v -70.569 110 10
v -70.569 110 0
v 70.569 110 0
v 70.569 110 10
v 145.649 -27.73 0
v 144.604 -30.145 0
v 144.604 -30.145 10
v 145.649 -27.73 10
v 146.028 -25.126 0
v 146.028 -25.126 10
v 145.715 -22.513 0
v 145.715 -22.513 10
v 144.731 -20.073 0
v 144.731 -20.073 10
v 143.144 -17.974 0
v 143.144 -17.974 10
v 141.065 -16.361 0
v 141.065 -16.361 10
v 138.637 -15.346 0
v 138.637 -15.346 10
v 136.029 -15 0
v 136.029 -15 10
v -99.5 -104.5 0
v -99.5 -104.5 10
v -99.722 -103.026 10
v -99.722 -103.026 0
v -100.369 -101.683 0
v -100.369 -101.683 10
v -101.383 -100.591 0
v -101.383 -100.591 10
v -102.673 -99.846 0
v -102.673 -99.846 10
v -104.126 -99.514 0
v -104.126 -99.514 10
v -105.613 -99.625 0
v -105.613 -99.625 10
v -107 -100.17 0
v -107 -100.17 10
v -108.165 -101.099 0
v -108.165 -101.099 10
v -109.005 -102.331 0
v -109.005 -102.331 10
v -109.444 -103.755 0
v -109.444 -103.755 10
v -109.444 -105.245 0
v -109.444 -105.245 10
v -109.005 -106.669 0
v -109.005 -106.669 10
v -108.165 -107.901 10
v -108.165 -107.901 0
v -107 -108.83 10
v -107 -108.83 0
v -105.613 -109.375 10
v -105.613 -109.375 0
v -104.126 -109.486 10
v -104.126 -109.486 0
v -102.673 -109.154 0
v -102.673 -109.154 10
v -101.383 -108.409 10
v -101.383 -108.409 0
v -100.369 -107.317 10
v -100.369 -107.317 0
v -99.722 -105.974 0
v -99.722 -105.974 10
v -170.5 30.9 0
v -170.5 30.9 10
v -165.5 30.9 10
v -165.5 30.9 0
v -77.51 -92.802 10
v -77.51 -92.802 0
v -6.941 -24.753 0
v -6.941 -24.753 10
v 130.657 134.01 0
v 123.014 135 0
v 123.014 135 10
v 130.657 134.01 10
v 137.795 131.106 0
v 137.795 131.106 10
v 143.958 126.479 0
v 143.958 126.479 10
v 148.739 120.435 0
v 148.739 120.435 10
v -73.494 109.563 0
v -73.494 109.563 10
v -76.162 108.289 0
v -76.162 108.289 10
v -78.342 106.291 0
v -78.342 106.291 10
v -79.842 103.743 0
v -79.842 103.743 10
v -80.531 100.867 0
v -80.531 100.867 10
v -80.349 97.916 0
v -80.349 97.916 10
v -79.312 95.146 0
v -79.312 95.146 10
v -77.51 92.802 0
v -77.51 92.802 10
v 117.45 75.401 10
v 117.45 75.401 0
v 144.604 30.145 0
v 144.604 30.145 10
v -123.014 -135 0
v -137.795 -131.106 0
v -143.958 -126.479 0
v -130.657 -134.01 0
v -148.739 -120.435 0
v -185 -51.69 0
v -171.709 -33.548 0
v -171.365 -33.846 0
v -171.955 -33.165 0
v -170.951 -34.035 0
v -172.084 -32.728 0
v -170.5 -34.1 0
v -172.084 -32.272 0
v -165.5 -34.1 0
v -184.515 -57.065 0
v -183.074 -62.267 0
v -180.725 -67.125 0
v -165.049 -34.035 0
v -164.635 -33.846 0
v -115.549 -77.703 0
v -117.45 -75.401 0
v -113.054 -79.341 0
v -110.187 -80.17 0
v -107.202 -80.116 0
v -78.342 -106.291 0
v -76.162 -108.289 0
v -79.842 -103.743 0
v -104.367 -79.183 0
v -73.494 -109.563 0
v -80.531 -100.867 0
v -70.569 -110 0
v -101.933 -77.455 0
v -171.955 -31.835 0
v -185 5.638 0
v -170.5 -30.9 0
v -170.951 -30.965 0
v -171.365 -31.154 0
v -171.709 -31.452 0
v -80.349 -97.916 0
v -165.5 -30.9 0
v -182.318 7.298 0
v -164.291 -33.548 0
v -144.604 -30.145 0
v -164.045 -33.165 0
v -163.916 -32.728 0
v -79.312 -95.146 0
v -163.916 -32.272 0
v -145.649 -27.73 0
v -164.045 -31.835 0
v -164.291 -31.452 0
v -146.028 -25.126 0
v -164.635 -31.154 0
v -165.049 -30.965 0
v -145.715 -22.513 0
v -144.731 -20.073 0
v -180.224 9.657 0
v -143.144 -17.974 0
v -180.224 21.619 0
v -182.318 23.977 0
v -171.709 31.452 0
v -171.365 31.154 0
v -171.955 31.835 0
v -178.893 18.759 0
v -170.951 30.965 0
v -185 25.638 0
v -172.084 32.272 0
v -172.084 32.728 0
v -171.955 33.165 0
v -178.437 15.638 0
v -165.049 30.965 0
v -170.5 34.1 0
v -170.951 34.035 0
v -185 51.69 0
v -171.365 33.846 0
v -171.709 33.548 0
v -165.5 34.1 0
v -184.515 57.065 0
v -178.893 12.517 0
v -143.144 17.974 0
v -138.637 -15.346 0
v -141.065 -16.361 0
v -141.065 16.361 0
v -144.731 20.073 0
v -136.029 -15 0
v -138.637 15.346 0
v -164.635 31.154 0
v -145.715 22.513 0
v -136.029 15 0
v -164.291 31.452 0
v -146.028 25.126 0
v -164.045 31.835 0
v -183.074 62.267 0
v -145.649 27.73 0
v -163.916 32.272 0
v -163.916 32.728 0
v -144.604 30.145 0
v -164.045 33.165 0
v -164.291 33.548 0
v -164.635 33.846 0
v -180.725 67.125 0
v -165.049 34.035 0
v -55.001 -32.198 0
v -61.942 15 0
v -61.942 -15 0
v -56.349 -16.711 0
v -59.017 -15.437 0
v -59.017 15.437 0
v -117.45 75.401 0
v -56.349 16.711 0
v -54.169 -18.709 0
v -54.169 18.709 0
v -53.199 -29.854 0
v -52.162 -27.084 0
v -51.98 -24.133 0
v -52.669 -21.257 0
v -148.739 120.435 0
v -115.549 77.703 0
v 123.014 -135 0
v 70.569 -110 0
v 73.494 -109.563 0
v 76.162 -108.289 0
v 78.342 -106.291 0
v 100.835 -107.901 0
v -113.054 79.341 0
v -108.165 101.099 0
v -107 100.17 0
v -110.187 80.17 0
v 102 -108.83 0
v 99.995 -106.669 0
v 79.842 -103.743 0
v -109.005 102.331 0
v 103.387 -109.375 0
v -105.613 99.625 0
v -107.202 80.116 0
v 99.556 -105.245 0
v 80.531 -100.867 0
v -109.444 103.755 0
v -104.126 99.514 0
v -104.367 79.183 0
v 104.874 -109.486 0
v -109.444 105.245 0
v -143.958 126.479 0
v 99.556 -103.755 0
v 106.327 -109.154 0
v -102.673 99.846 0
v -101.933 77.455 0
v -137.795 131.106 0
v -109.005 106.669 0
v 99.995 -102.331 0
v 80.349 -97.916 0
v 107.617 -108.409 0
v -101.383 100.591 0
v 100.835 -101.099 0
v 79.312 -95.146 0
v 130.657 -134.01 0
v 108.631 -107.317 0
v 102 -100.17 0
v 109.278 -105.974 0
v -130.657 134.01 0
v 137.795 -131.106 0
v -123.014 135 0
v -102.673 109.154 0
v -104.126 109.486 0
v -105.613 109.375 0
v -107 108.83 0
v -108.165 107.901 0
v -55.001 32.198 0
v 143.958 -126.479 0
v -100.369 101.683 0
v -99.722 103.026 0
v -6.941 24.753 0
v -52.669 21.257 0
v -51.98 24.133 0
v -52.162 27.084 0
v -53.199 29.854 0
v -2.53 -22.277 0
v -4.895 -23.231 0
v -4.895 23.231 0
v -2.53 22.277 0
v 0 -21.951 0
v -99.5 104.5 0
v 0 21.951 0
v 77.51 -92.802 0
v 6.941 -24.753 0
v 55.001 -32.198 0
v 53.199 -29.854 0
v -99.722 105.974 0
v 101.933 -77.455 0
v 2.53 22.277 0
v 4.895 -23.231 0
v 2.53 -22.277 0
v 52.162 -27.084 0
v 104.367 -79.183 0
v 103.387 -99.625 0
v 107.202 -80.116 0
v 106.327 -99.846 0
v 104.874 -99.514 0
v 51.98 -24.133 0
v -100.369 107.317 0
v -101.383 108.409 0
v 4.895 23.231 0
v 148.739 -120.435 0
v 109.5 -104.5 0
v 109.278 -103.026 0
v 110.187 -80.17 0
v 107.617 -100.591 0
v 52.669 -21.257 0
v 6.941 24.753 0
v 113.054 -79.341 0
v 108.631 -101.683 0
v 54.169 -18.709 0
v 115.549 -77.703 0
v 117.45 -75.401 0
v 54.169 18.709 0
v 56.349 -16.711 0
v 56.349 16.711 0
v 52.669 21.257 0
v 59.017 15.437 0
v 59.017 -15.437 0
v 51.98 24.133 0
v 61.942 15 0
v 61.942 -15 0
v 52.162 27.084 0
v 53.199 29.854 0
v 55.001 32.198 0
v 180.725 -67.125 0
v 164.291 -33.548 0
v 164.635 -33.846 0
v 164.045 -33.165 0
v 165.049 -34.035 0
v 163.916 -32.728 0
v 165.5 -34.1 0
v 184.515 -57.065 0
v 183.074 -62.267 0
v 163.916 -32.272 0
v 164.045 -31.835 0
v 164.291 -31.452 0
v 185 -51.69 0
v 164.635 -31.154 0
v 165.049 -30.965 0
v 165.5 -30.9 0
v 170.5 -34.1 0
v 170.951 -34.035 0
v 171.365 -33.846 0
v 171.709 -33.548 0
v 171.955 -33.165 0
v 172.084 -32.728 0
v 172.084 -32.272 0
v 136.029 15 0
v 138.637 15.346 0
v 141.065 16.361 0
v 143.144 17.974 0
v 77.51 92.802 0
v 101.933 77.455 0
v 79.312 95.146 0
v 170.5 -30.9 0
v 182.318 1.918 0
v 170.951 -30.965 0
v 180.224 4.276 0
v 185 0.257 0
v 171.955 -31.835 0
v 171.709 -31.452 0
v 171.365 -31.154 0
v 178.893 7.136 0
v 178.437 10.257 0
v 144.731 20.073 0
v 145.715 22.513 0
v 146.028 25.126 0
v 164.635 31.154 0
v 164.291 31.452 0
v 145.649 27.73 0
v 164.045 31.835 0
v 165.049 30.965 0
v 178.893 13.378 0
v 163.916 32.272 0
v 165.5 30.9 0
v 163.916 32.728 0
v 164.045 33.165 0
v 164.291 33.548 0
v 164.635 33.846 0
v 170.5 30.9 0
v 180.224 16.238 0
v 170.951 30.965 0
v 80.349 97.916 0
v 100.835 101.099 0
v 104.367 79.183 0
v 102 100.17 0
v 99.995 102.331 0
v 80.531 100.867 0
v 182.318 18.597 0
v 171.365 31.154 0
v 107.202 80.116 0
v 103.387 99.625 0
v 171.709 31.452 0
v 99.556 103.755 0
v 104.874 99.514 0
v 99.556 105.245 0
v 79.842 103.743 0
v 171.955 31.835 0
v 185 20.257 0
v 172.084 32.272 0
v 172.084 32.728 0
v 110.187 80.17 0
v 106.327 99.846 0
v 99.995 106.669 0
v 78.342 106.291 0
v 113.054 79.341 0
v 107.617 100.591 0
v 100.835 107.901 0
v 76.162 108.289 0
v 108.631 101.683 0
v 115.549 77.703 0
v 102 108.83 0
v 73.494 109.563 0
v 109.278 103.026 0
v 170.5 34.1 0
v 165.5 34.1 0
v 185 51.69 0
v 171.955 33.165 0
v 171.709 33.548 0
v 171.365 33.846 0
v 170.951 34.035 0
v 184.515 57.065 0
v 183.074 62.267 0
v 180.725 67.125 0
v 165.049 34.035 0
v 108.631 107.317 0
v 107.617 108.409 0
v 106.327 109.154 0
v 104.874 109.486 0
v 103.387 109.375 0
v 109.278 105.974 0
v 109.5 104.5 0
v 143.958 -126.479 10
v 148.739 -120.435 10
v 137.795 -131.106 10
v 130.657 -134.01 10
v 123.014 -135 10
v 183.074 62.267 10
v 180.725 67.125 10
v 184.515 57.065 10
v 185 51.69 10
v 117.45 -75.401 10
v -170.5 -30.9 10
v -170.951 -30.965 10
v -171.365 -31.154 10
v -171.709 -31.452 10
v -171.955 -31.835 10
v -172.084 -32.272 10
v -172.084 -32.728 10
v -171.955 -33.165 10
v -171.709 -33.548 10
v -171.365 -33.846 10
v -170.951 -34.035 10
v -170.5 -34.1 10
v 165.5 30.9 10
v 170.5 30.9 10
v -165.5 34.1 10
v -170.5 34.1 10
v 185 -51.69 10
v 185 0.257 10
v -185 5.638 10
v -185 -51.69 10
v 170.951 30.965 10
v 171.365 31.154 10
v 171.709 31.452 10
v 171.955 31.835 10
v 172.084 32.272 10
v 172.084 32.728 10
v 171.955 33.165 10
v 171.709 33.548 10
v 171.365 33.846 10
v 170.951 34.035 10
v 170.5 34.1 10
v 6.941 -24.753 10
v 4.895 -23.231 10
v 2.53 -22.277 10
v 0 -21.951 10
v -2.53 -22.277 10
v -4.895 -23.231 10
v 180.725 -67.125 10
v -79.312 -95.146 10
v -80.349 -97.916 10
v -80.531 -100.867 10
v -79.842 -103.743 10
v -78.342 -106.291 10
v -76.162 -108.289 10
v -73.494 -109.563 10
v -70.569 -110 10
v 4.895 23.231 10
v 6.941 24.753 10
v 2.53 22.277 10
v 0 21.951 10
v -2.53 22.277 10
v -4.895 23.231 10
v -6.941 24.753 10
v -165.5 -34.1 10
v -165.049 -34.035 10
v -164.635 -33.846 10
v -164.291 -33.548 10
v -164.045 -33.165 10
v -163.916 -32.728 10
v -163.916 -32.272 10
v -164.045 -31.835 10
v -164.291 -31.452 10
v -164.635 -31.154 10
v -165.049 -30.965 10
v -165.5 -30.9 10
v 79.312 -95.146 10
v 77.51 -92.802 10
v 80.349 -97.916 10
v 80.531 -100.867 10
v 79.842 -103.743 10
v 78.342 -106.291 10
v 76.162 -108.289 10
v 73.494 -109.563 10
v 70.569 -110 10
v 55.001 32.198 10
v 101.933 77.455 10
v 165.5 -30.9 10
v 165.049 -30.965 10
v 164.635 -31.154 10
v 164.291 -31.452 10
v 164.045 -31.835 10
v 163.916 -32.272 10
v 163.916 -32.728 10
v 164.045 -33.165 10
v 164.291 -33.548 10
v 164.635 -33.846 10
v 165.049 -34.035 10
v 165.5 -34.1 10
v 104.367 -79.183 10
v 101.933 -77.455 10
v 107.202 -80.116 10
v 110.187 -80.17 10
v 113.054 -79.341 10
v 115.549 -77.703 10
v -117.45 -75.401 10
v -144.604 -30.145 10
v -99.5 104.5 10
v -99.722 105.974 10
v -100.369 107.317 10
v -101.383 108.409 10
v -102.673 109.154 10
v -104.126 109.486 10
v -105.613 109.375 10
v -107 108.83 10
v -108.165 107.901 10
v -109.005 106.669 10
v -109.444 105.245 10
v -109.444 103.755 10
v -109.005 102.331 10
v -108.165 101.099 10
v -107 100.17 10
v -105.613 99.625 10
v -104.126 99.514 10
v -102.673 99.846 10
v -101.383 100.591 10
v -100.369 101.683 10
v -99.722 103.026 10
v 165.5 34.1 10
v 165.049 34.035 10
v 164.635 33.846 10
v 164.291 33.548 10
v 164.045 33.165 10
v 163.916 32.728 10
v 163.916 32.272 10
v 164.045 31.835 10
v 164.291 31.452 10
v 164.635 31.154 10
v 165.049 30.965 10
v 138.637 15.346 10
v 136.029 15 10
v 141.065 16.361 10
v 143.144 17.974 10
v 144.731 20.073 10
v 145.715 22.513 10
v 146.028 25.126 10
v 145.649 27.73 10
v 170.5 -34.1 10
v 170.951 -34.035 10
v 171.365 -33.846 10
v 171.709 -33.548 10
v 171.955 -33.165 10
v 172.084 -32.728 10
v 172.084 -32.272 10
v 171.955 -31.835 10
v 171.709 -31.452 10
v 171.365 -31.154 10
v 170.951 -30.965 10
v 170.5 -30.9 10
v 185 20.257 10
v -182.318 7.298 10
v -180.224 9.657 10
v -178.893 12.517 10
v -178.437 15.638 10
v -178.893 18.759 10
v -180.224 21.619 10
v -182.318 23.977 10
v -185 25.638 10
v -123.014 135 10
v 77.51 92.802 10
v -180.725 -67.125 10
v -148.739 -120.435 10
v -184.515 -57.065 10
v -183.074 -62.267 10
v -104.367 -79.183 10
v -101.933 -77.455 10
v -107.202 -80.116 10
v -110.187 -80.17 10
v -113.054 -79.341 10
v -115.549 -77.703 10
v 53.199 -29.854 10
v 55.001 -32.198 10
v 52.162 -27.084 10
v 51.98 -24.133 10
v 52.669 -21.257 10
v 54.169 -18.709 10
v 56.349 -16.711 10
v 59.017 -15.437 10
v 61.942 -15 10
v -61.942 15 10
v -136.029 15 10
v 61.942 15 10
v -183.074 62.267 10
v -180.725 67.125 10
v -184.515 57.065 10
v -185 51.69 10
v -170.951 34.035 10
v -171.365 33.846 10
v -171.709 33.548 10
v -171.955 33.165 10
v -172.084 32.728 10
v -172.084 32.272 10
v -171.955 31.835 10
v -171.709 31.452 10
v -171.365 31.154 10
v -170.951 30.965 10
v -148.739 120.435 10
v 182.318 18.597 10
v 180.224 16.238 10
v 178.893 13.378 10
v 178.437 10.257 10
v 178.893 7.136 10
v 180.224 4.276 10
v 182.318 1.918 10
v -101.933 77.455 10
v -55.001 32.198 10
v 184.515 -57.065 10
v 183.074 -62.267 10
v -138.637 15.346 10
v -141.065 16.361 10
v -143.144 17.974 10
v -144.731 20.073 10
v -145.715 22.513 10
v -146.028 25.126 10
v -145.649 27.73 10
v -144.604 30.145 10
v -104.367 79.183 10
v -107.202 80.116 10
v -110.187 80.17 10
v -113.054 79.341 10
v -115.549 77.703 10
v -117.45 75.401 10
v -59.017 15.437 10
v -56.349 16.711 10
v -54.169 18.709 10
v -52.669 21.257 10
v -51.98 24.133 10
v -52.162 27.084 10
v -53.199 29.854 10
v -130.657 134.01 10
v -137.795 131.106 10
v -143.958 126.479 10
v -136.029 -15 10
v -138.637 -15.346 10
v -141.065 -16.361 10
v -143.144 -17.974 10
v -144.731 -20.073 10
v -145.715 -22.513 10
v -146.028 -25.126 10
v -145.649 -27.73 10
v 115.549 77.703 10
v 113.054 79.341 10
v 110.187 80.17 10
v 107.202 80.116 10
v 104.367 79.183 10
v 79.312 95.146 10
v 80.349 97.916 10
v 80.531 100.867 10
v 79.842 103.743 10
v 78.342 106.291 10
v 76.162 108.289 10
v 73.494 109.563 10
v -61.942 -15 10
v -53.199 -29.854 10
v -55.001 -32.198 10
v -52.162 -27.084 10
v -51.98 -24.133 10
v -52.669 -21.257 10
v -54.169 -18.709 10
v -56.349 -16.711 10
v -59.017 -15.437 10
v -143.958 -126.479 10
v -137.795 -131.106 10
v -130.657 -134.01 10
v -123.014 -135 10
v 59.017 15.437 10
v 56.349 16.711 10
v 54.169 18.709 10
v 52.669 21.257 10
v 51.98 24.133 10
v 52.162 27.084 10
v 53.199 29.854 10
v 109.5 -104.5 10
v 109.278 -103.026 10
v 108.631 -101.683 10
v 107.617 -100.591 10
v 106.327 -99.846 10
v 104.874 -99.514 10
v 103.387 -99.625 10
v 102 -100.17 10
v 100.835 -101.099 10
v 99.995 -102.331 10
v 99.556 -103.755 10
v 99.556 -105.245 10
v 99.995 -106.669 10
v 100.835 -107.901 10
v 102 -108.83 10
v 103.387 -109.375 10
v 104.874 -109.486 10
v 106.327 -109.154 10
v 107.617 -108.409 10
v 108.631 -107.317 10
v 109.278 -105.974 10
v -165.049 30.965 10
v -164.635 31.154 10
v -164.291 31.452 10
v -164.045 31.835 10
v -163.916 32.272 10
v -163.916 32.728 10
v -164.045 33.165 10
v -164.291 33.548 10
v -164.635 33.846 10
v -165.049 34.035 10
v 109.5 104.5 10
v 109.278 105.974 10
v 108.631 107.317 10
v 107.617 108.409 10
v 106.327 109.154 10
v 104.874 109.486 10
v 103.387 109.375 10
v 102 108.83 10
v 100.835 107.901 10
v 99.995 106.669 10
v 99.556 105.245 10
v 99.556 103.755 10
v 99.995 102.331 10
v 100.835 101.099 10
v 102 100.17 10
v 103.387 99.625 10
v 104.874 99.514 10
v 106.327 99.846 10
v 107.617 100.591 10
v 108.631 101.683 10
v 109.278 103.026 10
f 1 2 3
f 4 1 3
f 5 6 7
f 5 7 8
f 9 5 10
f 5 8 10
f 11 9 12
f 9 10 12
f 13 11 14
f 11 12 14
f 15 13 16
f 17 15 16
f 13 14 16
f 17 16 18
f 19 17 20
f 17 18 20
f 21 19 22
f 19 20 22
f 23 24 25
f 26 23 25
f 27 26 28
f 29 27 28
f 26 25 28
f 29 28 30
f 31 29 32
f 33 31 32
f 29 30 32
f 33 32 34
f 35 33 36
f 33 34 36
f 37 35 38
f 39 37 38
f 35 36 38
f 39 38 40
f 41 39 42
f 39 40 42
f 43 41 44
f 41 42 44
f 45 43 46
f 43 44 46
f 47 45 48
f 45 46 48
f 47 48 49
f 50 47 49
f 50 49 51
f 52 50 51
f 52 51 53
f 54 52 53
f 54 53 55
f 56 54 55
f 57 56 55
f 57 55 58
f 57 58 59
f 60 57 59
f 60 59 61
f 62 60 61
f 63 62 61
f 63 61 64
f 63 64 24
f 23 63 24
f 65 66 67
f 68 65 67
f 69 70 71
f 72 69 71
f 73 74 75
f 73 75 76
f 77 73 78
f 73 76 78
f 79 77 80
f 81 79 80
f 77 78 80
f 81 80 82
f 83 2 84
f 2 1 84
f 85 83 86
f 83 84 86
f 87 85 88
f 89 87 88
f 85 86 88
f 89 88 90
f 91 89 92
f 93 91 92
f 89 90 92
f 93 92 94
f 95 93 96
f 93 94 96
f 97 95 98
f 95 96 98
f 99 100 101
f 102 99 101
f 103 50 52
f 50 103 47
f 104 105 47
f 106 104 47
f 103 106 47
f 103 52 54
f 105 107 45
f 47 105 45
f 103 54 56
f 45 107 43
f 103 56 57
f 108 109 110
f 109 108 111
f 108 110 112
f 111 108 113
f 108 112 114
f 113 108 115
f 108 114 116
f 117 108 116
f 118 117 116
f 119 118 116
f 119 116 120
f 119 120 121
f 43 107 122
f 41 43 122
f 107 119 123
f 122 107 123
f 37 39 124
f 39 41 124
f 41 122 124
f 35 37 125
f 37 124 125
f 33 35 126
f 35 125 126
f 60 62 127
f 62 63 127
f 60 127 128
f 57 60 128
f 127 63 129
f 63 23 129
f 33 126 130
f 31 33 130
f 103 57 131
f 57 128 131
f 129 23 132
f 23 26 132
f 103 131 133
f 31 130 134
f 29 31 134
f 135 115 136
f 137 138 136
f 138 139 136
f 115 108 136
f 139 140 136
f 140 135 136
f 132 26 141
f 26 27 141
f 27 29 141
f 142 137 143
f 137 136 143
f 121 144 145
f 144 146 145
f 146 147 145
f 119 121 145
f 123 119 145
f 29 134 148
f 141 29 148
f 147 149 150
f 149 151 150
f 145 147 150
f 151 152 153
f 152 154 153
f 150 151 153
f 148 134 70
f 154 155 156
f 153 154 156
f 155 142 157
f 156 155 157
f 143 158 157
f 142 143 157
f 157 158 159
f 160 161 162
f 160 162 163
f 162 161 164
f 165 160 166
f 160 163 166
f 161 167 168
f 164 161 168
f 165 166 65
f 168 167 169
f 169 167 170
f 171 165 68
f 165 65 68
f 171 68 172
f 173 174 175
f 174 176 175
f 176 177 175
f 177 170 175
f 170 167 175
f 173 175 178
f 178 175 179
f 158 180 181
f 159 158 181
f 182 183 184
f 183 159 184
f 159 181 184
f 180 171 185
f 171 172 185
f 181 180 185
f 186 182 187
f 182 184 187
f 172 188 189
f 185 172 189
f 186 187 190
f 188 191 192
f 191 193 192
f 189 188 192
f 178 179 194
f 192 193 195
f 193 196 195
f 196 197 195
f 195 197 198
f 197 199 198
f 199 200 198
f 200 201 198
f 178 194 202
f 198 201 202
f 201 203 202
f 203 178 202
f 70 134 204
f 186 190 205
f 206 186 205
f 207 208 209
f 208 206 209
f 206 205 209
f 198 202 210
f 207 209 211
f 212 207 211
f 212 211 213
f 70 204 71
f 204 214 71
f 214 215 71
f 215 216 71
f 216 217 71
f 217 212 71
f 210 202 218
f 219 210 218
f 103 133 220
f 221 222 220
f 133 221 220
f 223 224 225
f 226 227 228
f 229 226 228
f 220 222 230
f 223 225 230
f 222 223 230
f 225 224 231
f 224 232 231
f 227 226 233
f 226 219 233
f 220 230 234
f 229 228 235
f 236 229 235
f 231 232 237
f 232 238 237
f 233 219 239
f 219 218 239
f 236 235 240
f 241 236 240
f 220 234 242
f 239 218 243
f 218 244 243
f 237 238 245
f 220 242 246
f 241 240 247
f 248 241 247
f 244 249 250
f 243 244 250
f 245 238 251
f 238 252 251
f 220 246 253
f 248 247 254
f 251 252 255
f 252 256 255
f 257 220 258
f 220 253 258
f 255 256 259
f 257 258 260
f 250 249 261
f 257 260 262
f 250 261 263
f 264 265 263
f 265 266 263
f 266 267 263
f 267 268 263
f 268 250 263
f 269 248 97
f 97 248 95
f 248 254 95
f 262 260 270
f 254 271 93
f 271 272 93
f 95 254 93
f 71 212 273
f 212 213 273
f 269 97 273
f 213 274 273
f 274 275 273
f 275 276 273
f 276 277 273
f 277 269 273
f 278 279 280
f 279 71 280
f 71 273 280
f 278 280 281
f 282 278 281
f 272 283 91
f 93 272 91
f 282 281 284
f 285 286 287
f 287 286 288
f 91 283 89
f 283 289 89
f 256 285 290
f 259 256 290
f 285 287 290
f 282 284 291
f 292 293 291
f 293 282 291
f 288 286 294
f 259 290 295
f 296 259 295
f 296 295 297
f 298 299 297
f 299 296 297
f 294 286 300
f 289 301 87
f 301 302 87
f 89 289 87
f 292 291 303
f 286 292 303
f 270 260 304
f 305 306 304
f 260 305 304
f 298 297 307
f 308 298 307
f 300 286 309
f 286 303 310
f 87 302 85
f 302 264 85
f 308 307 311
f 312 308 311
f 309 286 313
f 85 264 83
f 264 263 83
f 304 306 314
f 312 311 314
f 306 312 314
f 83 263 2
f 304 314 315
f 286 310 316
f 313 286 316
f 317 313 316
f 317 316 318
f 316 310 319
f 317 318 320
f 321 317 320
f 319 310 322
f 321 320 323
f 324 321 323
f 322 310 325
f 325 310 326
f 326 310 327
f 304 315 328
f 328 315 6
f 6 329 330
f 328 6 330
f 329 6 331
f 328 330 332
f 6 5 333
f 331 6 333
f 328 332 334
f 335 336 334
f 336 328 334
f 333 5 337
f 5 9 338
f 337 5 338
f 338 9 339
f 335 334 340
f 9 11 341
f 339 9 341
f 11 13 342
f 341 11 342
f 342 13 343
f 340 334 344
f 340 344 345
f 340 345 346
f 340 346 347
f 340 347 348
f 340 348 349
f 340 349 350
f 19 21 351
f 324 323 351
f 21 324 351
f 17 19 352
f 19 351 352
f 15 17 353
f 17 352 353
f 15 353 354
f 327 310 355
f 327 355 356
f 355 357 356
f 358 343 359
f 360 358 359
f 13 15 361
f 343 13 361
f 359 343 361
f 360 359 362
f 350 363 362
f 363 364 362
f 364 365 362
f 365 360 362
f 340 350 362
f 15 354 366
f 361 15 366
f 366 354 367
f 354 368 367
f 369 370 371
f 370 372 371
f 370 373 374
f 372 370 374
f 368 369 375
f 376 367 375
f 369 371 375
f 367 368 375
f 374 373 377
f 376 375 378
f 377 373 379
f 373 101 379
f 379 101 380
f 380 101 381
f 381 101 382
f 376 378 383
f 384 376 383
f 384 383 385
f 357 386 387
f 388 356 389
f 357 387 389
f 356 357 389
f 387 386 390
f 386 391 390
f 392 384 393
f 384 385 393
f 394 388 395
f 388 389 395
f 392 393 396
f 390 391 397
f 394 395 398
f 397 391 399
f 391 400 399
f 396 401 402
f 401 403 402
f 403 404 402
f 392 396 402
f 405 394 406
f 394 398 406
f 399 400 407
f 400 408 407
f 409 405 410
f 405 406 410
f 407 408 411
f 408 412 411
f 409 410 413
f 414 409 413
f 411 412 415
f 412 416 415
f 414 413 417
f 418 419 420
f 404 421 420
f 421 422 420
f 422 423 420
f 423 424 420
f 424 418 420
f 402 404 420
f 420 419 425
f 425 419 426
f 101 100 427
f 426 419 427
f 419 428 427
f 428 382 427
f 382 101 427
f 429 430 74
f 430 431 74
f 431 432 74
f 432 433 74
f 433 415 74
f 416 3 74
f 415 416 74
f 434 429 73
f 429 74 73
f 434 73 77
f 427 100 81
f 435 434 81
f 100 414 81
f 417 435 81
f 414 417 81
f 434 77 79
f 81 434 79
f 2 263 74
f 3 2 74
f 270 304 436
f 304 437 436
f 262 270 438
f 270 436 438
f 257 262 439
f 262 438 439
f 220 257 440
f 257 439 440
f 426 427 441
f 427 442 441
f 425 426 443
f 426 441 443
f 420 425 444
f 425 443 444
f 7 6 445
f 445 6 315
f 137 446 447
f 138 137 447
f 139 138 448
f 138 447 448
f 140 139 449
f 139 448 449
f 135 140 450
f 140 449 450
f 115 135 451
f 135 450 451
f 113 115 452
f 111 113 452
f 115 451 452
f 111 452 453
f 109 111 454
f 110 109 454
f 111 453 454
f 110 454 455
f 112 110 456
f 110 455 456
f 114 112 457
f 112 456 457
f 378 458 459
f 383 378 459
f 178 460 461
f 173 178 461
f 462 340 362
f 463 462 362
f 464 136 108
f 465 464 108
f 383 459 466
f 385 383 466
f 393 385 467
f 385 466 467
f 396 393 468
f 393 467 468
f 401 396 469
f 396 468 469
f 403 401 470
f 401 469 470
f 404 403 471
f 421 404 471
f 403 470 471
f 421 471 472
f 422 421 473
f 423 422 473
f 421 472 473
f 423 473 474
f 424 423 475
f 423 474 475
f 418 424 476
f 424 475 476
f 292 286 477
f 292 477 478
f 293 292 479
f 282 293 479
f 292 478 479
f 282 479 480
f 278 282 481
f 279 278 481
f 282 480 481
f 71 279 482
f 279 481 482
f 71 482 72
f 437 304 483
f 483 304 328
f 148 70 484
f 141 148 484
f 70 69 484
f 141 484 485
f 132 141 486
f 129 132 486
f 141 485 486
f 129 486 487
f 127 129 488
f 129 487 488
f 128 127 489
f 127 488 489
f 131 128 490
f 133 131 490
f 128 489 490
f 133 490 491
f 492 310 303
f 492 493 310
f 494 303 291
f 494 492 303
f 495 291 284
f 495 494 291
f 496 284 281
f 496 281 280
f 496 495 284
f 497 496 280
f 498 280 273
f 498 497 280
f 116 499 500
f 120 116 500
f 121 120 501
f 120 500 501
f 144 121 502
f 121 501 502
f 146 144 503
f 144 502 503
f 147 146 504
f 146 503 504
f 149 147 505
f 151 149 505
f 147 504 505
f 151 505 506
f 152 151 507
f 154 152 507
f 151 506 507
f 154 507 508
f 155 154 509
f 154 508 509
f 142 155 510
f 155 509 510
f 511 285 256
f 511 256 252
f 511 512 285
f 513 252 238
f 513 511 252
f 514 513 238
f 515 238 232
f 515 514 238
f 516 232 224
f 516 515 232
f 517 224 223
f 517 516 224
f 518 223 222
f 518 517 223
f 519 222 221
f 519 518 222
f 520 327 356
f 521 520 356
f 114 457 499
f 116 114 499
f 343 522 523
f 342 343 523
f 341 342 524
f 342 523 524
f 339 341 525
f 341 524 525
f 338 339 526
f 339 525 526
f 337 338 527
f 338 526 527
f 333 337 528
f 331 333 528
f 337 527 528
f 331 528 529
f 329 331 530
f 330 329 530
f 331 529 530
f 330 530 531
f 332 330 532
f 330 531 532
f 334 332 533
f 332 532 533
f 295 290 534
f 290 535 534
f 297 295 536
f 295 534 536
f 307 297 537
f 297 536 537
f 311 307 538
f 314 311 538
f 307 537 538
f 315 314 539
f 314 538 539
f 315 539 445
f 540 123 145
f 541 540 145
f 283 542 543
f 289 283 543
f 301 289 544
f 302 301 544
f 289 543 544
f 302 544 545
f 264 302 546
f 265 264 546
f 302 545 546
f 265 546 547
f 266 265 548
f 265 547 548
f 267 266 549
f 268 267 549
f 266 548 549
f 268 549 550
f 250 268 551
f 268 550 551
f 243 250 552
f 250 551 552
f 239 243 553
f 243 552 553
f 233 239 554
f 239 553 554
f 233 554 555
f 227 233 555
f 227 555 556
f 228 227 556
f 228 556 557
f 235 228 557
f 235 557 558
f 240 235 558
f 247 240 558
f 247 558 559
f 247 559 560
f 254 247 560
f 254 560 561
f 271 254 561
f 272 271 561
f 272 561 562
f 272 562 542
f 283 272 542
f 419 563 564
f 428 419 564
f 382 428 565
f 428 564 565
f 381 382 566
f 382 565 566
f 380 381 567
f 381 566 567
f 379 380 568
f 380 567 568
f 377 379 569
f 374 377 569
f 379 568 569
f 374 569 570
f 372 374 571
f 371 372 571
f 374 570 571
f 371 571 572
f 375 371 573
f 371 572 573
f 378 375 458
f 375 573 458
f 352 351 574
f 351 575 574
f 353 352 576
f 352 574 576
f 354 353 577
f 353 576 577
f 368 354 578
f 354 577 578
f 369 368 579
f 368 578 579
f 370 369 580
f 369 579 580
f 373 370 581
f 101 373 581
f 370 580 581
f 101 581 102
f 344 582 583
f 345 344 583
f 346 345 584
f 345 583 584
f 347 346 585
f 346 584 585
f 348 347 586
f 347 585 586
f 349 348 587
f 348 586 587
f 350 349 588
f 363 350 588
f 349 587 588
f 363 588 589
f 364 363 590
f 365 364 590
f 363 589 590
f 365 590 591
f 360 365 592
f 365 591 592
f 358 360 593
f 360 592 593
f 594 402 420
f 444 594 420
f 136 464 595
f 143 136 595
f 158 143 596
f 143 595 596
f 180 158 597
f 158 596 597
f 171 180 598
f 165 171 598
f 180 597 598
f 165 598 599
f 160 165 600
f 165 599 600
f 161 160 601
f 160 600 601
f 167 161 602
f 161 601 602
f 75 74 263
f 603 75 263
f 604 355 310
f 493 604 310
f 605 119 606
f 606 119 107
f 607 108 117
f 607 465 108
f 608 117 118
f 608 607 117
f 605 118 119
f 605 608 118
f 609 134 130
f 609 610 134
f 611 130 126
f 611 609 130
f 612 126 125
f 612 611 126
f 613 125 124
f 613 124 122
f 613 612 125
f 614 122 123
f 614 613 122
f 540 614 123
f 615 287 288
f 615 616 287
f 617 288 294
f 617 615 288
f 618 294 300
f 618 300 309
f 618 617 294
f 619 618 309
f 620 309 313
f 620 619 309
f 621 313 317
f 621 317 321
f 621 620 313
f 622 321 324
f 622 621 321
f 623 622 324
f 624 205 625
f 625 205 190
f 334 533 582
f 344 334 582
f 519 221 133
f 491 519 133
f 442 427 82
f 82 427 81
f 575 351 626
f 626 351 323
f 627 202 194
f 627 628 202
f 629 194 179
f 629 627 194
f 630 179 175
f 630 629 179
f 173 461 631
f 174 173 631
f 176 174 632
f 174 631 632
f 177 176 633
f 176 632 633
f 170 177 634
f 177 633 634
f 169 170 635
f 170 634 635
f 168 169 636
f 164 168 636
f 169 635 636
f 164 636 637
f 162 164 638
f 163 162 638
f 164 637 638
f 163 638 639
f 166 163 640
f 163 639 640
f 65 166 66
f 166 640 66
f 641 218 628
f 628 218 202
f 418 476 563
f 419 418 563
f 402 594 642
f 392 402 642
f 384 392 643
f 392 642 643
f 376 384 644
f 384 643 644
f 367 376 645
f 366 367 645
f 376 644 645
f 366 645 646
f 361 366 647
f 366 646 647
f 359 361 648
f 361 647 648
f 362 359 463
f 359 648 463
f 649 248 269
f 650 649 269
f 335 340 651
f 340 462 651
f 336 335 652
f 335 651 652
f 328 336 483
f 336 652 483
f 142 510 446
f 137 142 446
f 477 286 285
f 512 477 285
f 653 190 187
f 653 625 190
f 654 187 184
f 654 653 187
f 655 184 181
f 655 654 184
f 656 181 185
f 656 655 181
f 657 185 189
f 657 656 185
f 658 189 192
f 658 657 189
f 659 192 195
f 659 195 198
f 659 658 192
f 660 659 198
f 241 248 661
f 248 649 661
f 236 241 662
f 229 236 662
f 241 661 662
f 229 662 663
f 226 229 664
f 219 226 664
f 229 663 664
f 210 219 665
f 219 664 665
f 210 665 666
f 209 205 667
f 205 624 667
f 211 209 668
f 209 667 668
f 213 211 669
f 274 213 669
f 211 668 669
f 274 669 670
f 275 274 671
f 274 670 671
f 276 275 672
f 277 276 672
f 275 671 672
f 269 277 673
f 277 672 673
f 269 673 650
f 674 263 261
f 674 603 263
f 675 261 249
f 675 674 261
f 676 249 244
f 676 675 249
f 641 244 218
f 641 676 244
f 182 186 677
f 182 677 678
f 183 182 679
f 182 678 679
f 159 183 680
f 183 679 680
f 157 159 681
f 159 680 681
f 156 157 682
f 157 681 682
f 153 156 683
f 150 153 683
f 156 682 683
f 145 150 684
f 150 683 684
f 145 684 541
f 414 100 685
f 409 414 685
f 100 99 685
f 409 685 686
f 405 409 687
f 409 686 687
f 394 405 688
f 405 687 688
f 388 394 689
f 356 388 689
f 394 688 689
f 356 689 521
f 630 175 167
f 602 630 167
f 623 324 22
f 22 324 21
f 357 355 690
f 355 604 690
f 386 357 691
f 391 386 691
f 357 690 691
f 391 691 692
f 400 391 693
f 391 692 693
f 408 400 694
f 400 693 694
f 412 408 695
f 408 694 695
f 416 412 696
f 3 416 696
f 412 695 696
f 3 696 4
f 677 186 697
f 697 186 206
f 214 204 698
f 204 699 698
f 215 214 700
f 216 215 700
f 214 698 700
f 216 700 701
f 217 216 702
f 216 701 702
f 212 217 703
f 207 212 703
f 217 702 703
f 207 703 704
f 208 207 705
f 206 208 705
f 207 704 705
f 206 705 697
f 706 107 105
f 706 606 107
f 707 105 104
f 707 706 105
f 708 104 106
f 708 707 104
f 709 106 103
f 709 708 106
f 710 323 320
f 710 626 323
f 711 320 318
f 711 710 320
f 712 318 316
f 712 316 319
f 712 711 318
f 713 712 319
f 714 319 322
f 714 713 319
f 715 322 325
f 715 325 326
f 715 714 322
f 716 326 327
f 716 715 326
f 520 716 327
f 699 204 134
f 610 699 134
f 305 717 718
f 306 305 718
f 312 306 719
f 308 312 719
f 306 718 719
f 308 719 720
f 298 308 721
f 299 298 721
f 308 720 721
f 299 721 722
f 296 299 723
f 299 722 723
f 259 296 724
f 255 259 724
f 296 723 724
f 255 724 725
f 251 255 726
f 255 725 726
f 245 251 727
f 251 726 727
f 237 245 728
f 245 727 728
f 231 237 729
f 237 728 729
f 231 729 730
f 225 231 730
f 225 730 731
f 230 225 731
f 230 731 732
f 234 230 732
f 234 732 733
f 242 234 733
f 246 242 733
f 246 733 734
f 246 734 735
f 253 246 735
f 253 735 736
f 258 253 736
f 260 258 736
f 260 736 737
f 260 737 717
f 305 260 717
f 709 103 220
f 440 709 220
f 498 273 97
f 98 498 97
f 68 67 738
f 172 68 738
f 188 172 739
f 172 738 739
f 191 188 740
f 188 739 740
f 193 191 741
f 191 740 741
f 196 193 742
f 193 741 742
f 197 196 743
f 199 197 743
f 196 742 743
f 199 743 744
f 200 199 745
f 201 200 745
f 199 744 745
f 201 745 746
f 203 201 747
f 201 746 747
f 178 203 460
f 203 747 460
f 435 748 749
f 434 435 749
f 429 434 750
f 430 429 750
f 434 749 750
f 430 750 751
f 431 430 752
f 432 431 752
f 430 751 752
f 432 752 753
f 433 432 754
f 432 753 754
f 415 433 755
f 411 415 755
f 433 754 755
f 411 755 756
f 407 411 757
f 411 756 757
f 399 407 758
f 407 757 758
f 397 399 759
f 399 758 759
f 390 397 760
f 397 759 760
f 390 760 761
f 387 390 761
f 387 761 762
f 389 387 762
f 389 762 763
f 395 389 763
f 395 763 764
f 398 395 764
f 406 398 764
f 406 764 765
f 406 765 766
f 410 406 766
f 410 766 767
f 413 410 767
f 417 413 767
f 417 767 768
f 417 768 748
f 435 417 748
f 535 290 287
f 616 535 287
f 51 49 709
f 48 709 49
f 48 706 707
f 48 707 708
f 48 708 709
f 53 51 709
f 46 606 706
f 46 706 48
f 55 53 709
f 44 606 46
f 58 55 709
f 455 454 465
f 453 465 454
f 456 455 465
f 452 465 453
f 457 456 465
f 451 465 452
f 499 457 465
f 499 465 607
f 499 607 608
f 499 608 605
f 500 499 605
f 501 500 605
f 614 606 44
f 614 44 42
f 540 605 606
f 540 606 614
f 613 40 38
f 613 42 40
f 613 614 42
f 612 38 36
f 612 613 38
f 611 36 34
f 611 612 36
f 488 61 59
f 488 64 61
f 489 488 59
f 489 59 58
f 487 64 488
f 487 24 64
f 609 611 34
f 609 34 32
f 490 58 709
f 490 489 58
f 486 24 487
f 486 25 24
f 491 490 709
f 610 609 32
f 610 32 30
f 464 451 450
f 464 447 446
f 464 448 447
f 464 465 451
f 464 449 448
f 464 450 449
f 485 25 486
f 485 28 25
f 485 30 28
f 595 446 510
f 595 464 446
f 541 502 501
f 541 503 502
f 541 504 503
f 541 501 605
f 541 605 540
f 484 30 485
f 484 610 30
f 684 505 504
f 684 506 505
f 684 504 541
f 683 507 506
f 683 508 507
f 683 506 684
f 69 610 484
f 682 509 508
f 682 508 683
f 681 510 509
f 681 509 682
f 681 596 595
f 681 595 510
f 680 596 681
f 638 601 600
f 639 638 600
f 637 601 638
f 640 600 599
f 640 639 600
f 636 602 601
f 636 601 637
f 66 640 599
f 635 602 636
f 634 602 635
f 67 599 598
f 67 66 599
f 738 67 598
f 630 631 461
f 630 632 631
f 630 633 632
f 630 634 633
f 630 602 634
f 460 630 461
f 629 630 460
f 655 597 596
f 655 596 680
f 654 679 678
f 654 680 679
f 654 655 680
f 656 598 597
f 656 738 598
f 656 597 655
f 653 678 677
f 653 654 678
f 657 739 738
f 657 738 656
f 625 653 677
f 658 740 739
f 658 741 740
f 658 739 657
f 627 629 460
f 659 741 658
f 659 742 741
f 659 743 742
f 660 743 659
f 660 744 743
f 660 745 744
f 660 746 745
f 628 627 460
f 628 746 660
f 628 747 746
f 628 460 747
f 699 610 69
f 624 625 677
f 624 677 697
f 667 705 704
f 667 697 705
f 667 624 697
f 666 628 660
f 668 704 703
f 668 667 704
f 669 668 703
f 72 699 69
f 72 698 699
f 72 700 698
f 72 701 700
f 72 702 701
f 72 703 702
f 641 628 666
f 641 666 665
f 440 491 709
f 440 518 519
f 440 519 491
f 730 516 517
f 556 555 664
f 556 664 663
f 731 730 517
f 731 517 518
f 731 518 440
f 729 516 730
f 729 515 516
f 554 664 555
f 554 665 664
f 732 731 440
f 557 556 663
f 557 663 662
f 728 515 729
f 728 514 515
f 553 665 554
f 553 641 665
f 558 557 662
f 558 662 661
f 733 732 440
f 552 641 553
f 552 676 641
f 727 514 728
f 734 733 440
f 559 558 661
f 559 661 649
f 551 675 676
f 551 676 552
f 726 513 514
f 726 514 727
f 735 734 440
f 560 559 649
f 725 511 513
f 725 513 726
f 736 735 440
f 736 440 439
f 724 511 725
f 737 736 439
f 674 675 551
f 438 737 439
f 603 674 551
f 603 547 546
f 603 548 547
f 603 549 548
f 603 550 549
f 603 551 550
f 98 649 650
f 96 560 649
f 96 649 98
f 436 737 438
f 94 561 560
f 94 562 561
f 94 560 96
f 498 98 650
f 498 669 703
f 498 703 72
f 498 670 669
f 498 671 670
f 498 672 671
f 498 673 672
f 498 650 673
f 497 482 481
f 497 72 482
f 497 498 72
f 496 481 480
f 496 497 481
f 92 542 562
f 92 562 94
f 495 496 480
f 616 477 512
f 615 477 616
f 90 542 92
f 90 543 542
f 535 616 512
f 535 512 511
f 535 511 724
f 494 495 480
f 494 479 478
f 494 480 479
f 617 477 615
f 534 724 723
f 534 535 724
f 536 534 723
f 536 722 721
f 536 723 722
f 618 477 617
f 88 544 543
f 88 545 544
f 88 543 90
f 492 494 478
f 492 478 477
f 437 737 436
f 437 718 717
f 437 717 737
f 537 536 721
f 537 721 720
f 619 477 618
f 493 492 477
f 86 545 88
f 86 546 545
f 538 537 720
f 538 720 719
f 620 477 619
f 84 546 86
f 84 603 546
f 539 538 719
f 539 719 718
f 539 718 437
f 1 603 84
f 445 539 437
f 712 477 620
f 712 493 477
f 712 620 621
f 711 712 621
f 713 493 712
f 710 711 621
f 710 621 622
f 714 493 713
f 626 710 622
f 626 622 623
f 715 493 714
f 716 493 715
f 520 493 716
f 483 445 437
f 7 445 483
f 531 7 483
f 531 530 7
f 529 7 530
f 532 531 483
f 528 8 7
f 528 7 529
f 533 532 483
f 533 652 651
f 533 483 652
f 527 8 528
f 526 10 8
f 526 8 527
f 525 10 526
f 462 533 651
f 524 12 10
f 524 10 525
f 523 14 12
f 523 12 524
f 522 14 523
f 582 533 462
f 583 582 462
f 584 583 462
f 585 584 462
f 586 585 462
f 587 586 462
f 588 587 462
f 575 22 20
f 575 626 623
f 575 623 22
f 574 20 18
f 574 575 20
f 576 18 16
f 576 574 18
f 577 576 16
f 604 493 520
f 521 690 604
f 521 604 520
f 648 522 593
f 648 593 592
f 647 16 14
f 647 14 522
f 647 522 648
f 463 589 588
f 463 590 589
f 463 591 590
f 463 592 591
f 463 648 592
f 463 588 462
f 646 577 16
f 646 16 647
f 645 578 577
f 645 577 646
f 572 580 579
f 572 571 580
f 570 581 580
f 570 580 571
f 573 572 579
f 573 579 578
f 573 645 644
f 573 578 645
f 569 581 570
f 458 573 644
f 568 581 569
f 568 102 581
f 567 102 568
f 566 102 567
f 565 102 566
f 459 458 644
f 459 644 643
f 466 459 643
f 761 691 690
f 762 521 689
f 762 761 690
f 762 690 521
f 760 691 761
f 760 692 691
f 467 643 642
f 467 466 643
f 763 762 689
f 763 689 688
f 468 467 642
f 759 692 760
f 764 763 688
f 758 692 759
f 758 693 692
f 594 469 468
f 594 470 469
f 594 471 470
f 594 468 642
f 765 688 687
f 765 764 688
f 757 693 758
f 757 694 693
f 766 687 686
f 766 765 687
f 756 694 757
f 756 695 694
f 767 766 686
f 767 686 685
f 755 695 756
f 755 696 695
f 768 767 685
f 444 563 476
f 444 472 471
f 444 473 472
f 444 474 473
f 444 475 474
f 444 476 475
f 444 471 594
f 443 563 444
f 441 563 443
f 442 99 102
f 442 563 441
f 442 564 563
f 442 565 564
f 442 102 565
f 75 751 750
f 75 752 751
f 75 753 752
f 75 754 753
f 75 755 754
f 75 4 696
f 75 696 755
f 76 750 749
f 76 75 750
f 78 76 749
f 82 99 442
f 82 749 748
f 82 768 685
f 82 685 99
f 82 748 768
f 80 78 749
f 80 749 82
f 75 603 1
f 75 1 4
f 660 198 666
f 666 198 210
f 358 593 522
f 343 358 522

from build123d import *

# Parameters (mm, degrees)
F1_DEPTH = 10
F2_R     = 10
F3_R     = 30
F5_DEPTH = 10.001
F6_R     = 5
F7_DEPTH = 10.001
F9_DEPTH = 10.001


with BuildPart() as f1:
    # F0 (on Top) → F1 (new body)
    with BuildSketch(Plane.XY):
        Polygon((140, 135), (-140, 135), (-185, 60), (-185, -60), (-140, -135), (140, -135), (185, -60), (185, 60), align=None)
        Polygon((-110.982108, -86.180622), (-153.690481, -15), (-37.165167, -15), align=None, mode=Mode.SUBTRACT)
        Polygon((95.345744, -110), (-95.345744, -110), (0, -18.059461), align=None, mode=Mode.SUBTRACT)
        Polygon((37.165167, -15), (153.690481, -15), (110.982108, -86.180622), align=None, mode=Mode.SUBTRACT)
        Polygon((-153.690481, 15), (-110.982108, 86.180622), (-37.165167, 15), align=None, mode=Mode.SUBTRACT)
        Polygon((0, 18.059461), (-95.345744, 110), (95.345744, 110), align=None, mode=Mode.SUBTRACT)
        Polygon((37.165167, 15), (110.982108, 86.180622), (153.690481, 15), align=None, mode=Mode.SUBTRACT)
    extrude(amount=F1_DEPTH)

    # F2
    f2_edges = [f1.edges().sort_by_distance(p)[0] for p in [
        (-110.982108, 86.180622, 5),
        (-153.690481, 15, 5),
        (-37.165167, 15, 5),
        (153.690481, 15, 5),
        (0, 18.059461, 5),
        (-95.345744, 110, 5),
        (95.345744, 110, 5),
        (-153.690481, -15, 5),
        (-37.165167, -15, 5),
        (-110.982108, -86.180622, 5),
        (0, -18.059461, 5),
        (-95.345744, -110, 5),
        (95.345744, -110, 5),
        (153.690481, -15, 5),
        (37.165167, -15, 5),
        (110.982108, -86.180622, 5),
        (110.982108, 86.180622, 5),
        (37.165167, 15, 5),
    ]]
    fillet(f2_edges, radius=F2_R)

    # F3
    f3_edges = [f1.edges().sort_by_distance(p)[0] for p in [
        (-185, 60, 5),
        (-140, 135, 5),
        (-185, -60, 5),
        (-140, -135, 5),
        (140, -135, 5),
        (185, -60, 5),
        (185, 60, 5),
        (140, 135, 5),
    ]]
    fillet(f3_edges, radius=F3_R)

    # F4 (on face) → F5 (cut, through all)
    with BuildSketch(Plane.XY.offset(10)):
        with BuildLine():
            ThreePointArc((-170.5, -30.9), (-172.1, -32.5), (-170.5, -34.1))
            Line((-170.5, -34.1), (-165.5, -34.1))
            ThreePointArc((-165.5, -34.1), (-163.9, -32.5), (-165.5, -30.9))
            Line((-165.5, -30.9), (-170.5, -30.9))
        make_face()
        with BuildLine():
            ThreePointArc((165.5, -30.9), (163.9, -32.5), (165.5, -34.1))
            Line((165.5, -34.1), (170.5, -34.1))
            ThreePointArc((170.5, -34.1), (172.1, -32.5), (170.5, -30.9))
            Line((170.5, -30.9), (165.5, -30.9))
        make_face()
        with BuildLine():
            ThreePointArc((165.5, 34.1), (163.9, 32.5), (165.5, 30.9))
            Line((165.5, 30.9), (170.5, 30.9))
            ThreePointArc((170.5, 30.9), (172.1, 32.5), (170.5, 34.1))
            Line((170.5, 34.1), (165.5, 34.1))
        make_face()
        with BuildLine():
            ThreePointArc((-170.5, 34.1), (-172.1, 32.5), (-170.5, 30.9))
            Line((-170.5, 30.9), (-165.5, 30.9))
            ThreePointArc((-165.5, 30.9), (-163.9, 32.5), (-165.5, 34.1))
            Line((-165.5, 34.1), (-170.5, 34.1))
        make_face()
    extrude(amount=-F5_DEPTH, mode=Mode.SUBTRACT)

    # F6 (on face) → F7 (cut, through all)
    with BuildSketch(Plane.XY.offset(10)):
        with Locations((-104.5, 104.5)):
            Circle(F6_R)
        with Locations((104.5, 104.5)):
            Circle(F6_R)
        with Locations((-104.5, -104.5)):
            Circle(F6_R)
        with Locations((104.5, -104.5)):
            Circle(F6_R)
    extrude(amount=-F7_DEPTH, mode=Mode.SUBTRACT)

    # F8 (on face) → F9 (cut, through all)
    with BuildSketch(Plane.XY.offset(10)):
        with BuildLine():
            Line((-185, 25.637901), (-185, 5.637901))
            ThreePointArc((-185, 5.637901), (-178.436607, 15.637901), (-185, 25.637901))
        make_face()
        with BuildLine():
            ThreePointArc((185, 20.257118), (178.436607, 10.257118), (185, 0.257118))
            Line((185, 0.257118), (185, 20.257118))
        make_face()
    extrude(amount=-F9_DEPTH, mode=Mode.SUBTRACT)


solid = f1.part
